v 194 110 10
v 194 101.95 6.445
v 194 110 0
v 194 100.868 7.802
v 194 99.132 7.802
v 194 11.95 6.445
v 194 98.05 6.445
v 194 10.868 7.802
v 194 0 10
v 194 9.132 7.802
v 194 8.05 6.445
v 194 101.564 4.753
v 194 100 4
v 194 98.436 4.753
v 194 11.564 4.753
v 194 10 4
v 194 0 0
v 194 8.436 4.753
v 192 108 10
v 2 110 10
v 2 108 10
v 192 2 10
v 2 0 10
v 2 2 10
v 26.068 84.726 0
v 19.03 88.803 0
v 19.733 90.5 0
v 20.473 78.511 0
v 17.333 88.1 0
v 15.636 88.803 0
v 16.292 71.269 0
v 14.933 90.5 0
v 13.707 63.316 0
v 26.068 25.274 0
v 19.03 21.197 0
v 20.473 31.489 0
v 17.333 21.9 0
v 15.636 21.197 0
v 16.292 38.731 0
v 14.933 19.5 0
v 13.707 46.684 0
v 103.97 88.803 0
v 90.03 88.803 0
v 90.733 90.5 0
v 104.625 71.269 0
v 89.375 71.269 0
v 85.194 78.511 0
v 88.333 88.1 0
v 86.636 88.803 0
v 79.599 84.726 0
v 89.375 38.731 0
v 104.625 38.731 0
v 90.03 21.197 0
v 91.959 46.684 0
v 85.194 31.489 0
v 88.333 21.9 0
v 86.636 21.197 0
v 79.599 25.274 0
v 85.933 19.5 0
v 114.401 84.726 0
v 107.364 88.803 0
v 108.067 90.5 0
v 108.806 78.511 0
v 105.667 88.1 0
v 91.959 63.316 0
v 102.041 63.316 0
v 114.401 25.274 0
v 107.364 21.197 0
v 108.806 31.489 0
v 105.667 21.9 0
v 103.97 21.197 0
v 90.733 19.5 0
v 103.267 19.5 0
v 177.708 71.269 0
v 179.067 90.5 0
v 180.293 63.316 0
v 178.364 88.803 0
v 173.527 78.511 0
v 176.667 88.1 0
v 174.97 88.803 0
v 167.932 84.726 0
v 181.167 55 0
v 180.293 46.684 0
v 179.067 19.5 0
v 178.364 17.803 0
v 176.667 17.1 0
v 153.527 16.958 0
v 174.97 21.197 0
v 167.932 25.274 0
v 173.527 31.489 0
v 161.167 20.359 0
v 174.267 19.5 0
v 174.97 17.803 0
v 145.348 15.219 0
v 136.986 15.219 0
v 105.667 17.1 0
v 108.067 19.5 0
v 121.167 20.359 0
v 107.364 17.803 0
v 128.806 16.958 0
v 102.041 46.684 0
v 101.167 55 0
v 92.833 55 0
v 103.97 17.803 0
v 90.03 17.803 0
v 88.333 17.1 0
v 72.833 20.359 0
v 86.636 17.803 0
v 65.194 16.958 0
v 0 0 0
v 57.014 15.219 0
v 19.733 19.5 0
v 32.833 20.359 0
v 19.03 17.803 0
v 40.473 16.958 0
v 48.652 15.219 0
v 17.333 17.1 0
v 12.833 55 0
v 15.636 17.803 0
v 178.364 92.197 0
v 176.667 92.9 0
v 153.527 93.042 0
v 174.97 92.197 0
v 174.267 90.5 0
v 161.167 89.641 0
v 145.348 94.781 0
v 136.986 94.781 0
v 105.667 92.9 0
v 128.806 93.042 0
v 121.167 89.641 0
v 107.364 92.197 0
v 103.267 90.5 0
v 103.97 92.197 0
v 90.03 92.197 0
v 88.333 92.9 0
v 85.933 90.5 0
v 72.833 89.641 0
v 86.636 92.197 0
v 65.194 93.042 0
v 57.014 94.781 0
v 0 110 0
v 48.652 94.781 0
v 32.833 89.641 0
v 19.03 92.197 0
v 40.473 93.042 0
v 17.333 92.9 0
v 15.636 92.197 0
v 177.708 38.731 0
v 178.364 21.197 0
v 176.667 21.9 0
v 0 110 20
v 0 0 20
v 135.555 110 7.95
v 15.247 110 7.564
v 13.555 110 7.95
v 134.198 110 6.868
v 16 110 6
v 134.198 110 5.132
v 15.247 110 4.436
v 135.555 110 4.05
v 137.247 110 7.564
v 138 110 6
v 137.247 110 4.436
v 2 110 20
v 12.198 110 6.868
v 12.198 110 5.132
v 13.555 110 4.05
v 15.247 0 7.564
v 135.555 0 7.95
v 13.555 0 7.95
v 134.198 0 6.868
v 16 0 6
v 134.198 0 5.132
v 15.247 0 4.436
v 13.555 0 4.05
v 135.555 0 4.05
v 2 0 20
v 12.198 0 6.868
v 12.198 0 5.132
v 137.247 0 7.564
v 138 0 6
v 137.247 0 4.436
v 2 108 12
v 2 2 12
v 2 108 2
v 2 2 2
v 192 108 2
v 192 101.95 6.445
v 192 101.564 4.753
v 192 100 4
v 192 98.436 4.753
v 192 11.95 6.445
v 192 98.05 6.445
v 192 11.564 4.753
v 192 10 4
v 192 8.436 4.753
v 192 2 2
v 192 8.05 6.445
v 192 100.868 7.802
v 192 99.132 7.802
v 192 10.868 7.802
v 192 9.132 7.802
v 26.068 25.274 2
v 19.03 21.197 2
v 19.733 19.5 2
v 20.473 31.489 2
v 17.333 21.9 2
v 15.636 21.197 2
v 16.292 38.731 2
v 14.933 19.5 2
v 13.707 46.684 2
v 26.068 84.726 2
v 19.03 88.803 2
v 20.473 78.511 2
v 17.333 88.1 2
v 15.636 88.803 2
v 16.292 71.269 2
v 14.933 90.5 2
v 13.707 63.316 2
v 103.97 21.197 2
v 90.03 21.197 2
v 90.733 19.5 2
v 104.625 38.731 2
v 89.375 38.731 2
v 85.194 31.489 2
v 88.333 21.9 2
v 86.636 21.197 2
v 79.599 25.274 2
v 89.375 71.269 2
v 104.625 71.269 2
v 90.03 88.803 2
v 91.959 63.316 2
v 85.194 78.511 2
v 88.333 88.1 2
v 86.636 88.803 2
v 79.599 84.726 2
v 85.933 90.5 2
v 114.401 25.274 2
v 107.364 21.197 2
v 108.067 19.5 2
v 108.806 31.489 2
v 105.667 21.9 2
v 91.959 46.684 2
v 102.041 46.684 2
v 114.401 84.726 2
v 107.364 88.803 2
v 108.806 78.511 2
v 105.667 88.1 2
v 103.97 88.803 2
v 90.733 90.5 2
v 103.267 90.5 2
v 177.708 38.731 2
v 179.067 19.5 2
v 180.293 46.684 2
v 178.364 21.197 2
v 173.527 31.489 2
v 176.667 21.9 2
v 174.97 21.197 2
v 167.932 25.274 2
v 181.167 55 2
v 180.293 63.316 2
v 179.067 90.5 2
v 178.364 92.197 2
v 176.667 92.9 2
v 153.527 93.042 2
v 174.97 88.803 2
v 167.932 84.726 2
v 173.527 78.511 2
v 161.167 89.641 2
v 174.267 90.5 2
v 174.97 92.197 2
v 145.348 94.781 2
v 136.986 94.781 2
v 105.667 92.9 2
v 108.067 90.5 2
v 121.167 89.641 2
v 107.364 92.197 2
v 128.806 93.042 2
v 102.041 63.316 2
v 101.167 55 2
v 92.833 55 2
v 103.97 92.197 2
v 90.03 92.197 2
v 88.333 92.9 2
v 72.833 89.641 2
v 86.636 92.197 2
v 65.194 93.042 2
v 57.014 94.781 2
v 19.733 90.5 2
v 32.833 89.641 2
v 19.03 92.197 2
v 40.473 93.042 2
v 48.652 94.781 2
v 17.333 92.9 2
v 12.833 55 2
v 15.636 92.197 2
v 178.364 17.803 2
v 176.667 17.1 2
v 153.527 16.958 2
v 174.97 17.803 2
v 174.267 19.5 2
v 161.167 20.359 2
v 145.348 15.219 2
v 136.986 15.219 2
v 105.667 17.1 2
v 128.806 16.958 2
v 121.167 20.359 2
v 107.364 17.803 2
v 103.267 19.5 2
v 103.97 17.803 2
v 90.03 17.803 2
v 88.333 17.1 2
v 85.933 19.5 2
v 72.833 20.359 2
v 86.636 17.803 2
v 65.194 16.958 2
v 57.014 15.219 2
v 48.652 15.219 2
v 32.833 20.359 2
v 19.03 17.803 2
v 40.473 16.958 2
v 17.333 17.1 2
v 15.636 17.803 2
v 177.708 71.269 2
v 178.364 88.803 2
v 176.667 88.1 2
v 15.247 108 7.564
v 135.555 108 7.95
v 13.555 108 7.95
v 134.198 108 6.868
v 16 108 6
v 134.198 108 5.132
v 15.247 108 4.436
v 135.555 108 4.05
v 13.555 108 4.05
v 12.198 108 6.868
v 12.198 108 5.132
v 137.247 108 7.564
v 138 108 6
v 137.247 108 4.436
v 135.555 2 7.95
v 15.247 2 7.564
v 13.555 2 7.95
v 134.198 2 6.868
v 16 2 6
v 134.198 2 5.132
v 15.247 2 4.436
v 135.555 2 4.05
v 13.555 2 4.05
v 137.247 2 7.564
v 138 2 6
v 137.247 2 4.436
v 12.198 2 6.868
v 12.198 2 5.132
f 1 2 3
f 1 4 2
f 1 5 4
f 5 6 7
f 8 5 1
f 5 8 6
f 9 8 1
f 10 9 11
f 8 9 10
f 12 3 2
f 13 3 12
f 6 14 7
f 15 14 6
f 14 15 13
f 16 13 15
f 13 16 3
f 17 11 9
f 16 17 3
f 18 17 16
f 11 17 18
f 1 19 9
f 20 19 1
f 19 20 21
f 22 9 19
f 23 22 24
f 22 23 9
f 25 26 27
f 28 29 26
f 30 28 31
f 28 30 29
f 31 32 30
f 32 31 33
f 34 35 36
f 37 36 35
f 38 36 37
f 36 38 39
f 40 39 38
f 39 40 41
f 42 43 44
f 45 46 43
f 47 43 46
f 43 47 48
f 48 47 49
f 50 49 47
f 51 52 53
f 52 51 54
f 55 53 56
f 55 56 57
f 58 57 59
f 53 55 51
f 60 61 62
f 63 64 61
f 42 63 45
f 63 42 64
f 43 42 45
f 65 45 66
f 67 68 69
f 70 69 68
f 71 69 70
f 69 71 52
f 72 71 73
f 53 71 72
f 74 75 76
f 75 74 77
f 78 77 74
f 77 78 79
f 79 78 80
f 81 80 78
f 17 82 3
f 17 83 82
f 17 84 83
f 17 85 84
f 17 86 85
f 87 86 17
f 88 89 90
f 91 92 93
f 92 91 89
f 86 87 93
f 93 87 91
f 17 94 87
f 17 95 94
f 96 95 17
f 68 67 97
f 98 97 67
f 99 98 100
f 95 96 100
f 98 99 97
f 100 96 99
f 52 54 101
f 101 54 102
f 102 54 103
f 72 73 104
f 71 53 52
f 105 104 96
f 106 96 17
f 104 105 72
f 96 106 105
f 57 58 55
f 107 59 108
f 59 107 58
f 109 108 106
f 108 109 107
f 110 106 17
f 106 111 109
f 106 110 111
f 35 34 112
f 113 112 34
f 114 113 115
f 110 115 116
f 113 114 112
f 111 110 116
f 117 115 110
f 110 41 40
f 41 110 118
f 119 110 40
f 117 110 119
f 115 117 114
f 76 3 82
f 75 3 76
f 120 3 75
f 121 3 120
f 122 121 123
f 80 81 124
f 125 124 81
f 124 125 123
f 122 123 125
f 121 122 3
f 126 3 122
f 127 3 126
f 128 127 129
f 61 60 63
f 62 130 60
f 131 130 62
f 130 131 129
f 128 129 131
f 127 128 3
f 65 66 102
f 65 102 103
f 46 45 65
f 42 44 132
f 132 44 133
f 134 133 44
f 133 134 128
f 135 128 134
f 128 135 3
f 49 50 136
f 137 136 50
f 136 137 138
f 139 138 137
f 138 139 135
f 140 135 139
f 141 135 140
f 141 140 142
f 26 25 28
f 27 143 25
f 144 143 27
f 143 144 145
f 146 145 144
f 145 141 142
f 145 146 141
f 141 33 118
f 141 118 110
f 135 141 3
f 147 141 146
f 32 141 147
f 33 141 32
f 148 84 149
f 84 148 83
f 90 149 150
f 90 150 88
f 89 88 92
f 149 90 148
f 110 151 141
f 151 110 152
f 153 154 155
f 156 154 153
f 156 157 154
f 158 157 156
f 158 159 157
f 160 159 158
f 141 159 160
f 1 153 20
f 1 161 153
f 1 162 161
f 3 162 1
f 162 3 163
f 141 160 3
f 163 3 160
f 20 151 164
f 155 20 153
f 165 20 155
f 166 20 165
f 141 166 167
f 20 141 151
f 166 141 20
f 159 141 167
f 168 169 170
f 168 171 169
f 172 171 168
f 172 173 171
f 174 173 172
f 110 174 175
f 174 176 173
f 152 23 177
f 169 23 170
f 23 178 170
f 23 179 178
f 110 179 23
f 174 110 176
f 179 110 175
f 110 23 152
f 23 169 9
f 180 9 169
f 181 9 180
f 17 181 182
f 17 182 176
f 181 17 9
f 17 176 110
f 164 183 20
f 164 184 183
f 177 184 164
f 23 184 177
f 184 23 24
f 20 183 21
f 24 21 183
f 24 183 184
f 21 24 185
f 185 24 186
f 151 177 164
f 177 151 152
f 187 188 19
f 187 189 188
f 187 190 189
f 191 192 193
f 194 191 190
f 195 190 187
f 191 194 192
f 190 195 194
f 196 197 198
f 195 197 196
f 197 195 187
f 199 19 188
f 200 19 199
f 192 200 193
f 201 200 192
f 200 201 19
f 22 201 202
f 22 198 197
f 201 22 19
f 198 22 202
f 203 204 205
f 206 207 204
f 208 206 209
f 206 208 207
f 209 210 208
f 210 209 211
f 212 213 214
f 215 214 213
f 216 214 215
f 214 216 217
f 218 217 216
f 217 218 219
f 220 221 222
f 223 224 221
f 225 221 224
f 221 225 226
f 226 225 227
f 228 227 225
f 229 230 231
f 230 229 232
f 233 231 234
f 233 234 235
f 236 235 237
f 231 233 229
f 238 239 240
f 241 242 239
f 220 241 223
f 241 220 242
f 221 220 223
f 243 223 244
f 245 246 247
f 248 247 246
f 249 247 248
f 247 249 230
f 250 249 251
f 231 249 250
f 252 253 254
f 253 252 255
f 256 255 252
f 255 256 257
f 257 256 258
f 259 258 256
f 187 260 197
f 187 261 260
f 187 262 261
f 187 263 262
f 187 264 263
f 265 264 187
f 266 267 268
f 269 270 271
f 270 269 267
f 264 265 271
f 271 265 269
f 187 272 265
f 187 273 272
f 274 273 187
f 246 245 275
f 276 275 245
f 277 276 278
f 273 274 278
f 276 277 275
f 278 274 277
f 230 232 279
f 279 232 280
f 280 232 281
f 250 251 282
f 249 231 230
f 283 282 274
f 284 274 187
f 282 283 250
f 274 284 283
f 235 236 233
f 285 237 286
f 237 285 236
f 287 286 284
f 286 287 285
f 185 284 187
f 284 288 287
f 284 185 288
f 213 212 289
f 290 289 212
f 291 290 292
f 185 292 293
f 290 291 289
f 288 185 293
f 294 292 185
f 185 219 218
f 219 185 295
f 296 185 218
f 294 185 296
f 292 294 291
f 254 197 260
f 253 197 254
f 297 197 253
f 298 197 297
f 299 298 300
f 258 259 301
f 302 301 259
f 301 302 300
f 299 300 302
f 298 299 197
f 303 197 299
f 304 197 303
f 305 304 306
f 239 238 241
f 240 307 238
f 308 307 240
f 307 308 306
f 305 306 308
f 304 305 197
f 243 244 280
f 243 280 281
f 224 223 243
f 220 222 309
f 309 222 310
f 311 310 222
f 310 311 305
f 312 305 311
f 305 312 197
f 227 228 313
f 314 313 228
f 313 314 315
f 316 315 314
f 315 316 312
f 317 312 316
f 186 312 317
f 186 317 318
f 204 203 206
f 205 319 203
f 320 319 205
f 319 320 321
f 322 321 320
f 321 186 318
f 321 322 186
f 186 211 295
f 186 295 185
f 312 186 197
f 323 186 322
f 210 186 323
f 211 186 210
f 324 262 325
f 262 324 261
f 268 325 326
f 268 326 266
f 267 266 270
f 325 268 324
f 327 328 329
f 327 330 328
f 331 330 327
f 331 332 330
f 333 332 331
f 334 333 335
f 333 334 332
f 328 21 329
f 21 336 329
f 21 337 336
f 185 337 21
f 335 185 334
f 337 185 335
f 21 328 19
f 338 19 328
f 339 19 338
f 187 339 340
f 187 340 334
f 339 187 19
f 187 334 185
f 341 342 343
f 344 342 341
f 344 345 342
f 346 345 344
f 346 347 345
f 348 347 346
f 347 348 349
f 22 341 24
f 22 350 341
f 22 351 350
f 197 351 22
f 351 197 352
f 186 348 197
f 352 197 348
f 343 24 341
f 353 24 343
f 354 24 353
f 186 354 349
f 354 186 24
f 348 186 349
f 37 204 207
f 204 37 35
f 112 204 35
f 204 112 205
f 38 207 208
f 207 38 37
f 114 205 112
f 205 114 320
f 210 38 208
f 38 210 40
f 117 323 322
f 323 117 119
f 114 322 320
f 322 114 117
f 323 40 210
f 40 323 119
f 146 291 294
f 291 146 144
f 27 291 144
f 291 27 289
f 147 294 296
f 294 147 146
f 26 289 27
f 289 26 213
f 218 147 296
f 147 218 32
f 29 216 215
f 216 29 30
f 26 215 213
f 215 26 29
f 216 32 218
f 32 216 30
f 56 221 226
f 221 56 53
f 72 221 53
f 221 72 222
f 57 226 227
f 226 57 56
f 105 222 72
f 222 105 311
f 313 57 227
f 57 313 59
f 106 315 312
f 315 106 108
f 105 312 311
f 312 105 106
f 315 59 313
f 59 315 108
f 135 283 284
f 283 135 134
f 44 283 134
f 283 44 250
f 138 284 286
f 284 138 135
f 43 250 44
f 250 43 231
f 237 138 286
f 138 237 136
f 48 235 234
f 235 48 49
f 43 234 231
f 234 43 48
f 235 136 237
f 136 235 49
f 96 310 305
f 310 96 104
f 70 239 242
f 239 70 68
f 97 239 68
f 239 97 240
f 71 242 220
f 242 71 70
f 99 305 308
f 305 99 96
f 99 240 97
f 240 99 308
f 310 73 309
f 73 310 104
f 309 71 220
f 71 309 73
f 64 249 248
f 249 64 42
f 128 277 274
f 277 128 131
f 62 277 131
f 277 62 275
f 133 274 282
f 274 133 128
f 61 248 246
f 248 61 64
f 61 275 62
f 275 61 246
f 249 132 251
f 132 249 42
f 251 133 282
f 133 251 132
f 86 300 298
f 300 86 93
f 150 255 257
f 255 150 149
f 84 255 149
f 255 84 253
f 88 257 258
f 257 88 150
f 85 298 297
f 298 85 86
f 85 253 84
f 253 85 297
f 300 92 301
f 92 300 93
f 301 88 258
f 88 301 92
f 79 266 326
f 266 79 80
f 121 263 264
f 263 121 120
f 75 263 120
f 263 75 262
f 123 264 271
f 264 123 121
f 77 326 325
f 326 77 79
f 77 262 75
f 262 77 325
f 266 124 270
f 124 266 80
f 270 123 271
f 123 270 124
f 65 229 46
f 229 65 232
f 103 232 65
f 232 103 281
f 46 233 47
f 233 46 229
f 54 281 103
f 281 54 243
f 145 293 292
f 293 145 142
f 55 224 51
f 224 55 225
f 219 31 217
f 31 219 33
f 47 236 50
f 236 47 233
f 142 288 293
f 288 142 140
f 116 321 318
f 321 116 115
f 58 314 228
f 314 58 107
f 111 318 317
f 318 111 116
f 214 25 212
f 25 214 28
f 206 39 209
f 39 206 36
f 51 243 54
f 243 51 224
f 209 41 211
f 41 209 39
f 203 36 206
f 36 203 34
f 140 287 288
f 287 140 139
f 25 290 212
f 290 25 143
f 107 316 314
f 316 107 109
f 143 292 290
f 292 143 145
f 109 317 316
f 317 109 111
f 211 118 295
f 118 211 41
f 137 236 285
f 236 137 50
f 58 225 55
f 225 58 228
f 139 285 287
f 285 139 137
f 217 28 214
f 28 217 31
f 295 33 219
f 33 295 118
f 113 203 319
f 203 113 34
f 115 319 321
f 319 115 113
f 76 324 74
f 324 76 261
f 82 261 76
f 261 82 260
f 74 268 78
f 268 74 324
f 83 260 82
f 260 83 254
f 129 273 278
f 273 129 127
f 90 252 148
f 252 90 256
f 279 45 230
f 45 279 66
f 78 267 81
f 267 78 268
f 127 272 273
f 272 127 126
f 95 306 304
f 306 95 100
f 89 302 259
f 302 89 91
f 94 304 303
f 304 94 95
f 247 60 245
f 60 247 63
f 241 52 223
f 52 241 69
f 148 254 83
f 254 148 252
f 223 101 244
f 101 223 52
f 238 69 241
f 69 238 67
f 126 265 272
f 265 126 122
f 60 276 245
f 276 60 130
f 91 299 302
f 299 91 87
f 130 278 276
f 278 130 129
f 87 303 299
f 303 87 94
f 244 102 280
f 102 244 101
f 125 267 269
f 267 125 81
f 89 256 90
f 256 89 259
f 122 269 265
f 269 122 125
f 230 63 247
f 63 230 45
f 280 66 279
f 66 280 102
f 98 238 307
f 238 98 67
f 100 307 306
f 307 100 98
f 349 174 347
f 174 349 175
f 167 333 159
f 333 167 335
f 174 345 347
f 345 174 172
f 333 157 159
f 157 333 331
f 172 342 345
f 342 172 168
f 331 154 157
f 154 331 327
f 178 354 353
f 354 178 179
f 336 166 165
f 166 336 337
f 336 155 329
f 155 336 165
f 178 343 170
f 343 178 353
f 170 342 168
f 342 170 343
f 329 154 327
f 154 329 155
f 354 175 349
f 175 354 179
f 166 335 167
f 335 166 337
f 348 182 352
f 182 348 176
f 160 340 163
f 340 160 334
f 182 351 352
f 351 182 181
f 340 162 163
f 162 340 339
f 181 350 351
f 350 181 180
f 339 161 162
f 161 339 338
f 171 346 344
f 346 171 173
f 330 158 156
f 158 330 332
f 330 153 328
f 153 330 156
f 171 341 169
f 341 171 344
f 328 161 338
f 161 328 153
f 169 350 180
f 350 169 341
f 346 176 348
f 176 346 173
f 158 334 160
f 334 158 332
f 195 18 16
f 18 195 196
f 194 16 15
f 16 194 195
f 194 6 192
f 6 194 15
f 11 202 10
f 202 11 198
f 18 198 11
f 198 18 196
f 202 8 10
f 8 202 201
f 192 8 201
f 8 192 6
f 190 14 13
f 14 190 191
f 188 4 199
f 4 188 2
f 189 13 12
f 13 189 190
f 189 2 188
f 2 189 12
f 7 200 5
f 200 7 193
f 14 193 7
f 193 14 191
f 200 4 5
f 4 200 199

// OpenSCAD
w = 110;
l = 194;
h = 10;
h2 = 20;
s = 2;


fm = 71;
fmh = 80;

hr = 2.4;
hr2 = 2.0;

hd = 6;
hx1 = 14;
hx2 = 136;

hy = 10;

difference(){
union(){
cube([l,w,h]);
cube([s,w,h2]);
}
translate([s,s,s]) cube([l-2*s,w-2*s,h]);

mx = (l-2*fm)/3;
my = (w-fm)/2;

translate([mx,my,0])cylinder(s,hr,hr);
translate([mx,w-my,0])cylinder(s,hr,hr);
translate([mx+fm,my,0])cylinder(s,hr,hr);
translate([mx+fm,my+fm,0])cylinder(s,hr,hr);

translate([mx*2+fm,my,0])cylinder(s,hr,hr);
translate([mx*2+fm,w-my,0])cylinder(s,hr,hr);
translate([l-mx,my,0])cylinder(s,hr,hr);
translate([l-mx,my+fm,0])cylinder(s,hr,hr);

translate([mx+fm/2,my+fm/2,0])cylinder(s,fmh/2,fmh/2);
translate([l-(mx+fm/2),my+fm/2,0])cylinder(s,fmh/2,fmh/2);


translate([hx1,0,hd])rotate([-90,0,0])cylinder(w,hr2,hr2);
translate([hx2,0,hd])rotate([-90,0,0])cylinder(w,hr2,hr2);

translate([s,hy,hd])rotate([0,90,0])cylinder(l,hr2,hr2);
translate([s,w-hy,hd])rotate([0,90,0])cylinder(l,hr2,hr2);


}
